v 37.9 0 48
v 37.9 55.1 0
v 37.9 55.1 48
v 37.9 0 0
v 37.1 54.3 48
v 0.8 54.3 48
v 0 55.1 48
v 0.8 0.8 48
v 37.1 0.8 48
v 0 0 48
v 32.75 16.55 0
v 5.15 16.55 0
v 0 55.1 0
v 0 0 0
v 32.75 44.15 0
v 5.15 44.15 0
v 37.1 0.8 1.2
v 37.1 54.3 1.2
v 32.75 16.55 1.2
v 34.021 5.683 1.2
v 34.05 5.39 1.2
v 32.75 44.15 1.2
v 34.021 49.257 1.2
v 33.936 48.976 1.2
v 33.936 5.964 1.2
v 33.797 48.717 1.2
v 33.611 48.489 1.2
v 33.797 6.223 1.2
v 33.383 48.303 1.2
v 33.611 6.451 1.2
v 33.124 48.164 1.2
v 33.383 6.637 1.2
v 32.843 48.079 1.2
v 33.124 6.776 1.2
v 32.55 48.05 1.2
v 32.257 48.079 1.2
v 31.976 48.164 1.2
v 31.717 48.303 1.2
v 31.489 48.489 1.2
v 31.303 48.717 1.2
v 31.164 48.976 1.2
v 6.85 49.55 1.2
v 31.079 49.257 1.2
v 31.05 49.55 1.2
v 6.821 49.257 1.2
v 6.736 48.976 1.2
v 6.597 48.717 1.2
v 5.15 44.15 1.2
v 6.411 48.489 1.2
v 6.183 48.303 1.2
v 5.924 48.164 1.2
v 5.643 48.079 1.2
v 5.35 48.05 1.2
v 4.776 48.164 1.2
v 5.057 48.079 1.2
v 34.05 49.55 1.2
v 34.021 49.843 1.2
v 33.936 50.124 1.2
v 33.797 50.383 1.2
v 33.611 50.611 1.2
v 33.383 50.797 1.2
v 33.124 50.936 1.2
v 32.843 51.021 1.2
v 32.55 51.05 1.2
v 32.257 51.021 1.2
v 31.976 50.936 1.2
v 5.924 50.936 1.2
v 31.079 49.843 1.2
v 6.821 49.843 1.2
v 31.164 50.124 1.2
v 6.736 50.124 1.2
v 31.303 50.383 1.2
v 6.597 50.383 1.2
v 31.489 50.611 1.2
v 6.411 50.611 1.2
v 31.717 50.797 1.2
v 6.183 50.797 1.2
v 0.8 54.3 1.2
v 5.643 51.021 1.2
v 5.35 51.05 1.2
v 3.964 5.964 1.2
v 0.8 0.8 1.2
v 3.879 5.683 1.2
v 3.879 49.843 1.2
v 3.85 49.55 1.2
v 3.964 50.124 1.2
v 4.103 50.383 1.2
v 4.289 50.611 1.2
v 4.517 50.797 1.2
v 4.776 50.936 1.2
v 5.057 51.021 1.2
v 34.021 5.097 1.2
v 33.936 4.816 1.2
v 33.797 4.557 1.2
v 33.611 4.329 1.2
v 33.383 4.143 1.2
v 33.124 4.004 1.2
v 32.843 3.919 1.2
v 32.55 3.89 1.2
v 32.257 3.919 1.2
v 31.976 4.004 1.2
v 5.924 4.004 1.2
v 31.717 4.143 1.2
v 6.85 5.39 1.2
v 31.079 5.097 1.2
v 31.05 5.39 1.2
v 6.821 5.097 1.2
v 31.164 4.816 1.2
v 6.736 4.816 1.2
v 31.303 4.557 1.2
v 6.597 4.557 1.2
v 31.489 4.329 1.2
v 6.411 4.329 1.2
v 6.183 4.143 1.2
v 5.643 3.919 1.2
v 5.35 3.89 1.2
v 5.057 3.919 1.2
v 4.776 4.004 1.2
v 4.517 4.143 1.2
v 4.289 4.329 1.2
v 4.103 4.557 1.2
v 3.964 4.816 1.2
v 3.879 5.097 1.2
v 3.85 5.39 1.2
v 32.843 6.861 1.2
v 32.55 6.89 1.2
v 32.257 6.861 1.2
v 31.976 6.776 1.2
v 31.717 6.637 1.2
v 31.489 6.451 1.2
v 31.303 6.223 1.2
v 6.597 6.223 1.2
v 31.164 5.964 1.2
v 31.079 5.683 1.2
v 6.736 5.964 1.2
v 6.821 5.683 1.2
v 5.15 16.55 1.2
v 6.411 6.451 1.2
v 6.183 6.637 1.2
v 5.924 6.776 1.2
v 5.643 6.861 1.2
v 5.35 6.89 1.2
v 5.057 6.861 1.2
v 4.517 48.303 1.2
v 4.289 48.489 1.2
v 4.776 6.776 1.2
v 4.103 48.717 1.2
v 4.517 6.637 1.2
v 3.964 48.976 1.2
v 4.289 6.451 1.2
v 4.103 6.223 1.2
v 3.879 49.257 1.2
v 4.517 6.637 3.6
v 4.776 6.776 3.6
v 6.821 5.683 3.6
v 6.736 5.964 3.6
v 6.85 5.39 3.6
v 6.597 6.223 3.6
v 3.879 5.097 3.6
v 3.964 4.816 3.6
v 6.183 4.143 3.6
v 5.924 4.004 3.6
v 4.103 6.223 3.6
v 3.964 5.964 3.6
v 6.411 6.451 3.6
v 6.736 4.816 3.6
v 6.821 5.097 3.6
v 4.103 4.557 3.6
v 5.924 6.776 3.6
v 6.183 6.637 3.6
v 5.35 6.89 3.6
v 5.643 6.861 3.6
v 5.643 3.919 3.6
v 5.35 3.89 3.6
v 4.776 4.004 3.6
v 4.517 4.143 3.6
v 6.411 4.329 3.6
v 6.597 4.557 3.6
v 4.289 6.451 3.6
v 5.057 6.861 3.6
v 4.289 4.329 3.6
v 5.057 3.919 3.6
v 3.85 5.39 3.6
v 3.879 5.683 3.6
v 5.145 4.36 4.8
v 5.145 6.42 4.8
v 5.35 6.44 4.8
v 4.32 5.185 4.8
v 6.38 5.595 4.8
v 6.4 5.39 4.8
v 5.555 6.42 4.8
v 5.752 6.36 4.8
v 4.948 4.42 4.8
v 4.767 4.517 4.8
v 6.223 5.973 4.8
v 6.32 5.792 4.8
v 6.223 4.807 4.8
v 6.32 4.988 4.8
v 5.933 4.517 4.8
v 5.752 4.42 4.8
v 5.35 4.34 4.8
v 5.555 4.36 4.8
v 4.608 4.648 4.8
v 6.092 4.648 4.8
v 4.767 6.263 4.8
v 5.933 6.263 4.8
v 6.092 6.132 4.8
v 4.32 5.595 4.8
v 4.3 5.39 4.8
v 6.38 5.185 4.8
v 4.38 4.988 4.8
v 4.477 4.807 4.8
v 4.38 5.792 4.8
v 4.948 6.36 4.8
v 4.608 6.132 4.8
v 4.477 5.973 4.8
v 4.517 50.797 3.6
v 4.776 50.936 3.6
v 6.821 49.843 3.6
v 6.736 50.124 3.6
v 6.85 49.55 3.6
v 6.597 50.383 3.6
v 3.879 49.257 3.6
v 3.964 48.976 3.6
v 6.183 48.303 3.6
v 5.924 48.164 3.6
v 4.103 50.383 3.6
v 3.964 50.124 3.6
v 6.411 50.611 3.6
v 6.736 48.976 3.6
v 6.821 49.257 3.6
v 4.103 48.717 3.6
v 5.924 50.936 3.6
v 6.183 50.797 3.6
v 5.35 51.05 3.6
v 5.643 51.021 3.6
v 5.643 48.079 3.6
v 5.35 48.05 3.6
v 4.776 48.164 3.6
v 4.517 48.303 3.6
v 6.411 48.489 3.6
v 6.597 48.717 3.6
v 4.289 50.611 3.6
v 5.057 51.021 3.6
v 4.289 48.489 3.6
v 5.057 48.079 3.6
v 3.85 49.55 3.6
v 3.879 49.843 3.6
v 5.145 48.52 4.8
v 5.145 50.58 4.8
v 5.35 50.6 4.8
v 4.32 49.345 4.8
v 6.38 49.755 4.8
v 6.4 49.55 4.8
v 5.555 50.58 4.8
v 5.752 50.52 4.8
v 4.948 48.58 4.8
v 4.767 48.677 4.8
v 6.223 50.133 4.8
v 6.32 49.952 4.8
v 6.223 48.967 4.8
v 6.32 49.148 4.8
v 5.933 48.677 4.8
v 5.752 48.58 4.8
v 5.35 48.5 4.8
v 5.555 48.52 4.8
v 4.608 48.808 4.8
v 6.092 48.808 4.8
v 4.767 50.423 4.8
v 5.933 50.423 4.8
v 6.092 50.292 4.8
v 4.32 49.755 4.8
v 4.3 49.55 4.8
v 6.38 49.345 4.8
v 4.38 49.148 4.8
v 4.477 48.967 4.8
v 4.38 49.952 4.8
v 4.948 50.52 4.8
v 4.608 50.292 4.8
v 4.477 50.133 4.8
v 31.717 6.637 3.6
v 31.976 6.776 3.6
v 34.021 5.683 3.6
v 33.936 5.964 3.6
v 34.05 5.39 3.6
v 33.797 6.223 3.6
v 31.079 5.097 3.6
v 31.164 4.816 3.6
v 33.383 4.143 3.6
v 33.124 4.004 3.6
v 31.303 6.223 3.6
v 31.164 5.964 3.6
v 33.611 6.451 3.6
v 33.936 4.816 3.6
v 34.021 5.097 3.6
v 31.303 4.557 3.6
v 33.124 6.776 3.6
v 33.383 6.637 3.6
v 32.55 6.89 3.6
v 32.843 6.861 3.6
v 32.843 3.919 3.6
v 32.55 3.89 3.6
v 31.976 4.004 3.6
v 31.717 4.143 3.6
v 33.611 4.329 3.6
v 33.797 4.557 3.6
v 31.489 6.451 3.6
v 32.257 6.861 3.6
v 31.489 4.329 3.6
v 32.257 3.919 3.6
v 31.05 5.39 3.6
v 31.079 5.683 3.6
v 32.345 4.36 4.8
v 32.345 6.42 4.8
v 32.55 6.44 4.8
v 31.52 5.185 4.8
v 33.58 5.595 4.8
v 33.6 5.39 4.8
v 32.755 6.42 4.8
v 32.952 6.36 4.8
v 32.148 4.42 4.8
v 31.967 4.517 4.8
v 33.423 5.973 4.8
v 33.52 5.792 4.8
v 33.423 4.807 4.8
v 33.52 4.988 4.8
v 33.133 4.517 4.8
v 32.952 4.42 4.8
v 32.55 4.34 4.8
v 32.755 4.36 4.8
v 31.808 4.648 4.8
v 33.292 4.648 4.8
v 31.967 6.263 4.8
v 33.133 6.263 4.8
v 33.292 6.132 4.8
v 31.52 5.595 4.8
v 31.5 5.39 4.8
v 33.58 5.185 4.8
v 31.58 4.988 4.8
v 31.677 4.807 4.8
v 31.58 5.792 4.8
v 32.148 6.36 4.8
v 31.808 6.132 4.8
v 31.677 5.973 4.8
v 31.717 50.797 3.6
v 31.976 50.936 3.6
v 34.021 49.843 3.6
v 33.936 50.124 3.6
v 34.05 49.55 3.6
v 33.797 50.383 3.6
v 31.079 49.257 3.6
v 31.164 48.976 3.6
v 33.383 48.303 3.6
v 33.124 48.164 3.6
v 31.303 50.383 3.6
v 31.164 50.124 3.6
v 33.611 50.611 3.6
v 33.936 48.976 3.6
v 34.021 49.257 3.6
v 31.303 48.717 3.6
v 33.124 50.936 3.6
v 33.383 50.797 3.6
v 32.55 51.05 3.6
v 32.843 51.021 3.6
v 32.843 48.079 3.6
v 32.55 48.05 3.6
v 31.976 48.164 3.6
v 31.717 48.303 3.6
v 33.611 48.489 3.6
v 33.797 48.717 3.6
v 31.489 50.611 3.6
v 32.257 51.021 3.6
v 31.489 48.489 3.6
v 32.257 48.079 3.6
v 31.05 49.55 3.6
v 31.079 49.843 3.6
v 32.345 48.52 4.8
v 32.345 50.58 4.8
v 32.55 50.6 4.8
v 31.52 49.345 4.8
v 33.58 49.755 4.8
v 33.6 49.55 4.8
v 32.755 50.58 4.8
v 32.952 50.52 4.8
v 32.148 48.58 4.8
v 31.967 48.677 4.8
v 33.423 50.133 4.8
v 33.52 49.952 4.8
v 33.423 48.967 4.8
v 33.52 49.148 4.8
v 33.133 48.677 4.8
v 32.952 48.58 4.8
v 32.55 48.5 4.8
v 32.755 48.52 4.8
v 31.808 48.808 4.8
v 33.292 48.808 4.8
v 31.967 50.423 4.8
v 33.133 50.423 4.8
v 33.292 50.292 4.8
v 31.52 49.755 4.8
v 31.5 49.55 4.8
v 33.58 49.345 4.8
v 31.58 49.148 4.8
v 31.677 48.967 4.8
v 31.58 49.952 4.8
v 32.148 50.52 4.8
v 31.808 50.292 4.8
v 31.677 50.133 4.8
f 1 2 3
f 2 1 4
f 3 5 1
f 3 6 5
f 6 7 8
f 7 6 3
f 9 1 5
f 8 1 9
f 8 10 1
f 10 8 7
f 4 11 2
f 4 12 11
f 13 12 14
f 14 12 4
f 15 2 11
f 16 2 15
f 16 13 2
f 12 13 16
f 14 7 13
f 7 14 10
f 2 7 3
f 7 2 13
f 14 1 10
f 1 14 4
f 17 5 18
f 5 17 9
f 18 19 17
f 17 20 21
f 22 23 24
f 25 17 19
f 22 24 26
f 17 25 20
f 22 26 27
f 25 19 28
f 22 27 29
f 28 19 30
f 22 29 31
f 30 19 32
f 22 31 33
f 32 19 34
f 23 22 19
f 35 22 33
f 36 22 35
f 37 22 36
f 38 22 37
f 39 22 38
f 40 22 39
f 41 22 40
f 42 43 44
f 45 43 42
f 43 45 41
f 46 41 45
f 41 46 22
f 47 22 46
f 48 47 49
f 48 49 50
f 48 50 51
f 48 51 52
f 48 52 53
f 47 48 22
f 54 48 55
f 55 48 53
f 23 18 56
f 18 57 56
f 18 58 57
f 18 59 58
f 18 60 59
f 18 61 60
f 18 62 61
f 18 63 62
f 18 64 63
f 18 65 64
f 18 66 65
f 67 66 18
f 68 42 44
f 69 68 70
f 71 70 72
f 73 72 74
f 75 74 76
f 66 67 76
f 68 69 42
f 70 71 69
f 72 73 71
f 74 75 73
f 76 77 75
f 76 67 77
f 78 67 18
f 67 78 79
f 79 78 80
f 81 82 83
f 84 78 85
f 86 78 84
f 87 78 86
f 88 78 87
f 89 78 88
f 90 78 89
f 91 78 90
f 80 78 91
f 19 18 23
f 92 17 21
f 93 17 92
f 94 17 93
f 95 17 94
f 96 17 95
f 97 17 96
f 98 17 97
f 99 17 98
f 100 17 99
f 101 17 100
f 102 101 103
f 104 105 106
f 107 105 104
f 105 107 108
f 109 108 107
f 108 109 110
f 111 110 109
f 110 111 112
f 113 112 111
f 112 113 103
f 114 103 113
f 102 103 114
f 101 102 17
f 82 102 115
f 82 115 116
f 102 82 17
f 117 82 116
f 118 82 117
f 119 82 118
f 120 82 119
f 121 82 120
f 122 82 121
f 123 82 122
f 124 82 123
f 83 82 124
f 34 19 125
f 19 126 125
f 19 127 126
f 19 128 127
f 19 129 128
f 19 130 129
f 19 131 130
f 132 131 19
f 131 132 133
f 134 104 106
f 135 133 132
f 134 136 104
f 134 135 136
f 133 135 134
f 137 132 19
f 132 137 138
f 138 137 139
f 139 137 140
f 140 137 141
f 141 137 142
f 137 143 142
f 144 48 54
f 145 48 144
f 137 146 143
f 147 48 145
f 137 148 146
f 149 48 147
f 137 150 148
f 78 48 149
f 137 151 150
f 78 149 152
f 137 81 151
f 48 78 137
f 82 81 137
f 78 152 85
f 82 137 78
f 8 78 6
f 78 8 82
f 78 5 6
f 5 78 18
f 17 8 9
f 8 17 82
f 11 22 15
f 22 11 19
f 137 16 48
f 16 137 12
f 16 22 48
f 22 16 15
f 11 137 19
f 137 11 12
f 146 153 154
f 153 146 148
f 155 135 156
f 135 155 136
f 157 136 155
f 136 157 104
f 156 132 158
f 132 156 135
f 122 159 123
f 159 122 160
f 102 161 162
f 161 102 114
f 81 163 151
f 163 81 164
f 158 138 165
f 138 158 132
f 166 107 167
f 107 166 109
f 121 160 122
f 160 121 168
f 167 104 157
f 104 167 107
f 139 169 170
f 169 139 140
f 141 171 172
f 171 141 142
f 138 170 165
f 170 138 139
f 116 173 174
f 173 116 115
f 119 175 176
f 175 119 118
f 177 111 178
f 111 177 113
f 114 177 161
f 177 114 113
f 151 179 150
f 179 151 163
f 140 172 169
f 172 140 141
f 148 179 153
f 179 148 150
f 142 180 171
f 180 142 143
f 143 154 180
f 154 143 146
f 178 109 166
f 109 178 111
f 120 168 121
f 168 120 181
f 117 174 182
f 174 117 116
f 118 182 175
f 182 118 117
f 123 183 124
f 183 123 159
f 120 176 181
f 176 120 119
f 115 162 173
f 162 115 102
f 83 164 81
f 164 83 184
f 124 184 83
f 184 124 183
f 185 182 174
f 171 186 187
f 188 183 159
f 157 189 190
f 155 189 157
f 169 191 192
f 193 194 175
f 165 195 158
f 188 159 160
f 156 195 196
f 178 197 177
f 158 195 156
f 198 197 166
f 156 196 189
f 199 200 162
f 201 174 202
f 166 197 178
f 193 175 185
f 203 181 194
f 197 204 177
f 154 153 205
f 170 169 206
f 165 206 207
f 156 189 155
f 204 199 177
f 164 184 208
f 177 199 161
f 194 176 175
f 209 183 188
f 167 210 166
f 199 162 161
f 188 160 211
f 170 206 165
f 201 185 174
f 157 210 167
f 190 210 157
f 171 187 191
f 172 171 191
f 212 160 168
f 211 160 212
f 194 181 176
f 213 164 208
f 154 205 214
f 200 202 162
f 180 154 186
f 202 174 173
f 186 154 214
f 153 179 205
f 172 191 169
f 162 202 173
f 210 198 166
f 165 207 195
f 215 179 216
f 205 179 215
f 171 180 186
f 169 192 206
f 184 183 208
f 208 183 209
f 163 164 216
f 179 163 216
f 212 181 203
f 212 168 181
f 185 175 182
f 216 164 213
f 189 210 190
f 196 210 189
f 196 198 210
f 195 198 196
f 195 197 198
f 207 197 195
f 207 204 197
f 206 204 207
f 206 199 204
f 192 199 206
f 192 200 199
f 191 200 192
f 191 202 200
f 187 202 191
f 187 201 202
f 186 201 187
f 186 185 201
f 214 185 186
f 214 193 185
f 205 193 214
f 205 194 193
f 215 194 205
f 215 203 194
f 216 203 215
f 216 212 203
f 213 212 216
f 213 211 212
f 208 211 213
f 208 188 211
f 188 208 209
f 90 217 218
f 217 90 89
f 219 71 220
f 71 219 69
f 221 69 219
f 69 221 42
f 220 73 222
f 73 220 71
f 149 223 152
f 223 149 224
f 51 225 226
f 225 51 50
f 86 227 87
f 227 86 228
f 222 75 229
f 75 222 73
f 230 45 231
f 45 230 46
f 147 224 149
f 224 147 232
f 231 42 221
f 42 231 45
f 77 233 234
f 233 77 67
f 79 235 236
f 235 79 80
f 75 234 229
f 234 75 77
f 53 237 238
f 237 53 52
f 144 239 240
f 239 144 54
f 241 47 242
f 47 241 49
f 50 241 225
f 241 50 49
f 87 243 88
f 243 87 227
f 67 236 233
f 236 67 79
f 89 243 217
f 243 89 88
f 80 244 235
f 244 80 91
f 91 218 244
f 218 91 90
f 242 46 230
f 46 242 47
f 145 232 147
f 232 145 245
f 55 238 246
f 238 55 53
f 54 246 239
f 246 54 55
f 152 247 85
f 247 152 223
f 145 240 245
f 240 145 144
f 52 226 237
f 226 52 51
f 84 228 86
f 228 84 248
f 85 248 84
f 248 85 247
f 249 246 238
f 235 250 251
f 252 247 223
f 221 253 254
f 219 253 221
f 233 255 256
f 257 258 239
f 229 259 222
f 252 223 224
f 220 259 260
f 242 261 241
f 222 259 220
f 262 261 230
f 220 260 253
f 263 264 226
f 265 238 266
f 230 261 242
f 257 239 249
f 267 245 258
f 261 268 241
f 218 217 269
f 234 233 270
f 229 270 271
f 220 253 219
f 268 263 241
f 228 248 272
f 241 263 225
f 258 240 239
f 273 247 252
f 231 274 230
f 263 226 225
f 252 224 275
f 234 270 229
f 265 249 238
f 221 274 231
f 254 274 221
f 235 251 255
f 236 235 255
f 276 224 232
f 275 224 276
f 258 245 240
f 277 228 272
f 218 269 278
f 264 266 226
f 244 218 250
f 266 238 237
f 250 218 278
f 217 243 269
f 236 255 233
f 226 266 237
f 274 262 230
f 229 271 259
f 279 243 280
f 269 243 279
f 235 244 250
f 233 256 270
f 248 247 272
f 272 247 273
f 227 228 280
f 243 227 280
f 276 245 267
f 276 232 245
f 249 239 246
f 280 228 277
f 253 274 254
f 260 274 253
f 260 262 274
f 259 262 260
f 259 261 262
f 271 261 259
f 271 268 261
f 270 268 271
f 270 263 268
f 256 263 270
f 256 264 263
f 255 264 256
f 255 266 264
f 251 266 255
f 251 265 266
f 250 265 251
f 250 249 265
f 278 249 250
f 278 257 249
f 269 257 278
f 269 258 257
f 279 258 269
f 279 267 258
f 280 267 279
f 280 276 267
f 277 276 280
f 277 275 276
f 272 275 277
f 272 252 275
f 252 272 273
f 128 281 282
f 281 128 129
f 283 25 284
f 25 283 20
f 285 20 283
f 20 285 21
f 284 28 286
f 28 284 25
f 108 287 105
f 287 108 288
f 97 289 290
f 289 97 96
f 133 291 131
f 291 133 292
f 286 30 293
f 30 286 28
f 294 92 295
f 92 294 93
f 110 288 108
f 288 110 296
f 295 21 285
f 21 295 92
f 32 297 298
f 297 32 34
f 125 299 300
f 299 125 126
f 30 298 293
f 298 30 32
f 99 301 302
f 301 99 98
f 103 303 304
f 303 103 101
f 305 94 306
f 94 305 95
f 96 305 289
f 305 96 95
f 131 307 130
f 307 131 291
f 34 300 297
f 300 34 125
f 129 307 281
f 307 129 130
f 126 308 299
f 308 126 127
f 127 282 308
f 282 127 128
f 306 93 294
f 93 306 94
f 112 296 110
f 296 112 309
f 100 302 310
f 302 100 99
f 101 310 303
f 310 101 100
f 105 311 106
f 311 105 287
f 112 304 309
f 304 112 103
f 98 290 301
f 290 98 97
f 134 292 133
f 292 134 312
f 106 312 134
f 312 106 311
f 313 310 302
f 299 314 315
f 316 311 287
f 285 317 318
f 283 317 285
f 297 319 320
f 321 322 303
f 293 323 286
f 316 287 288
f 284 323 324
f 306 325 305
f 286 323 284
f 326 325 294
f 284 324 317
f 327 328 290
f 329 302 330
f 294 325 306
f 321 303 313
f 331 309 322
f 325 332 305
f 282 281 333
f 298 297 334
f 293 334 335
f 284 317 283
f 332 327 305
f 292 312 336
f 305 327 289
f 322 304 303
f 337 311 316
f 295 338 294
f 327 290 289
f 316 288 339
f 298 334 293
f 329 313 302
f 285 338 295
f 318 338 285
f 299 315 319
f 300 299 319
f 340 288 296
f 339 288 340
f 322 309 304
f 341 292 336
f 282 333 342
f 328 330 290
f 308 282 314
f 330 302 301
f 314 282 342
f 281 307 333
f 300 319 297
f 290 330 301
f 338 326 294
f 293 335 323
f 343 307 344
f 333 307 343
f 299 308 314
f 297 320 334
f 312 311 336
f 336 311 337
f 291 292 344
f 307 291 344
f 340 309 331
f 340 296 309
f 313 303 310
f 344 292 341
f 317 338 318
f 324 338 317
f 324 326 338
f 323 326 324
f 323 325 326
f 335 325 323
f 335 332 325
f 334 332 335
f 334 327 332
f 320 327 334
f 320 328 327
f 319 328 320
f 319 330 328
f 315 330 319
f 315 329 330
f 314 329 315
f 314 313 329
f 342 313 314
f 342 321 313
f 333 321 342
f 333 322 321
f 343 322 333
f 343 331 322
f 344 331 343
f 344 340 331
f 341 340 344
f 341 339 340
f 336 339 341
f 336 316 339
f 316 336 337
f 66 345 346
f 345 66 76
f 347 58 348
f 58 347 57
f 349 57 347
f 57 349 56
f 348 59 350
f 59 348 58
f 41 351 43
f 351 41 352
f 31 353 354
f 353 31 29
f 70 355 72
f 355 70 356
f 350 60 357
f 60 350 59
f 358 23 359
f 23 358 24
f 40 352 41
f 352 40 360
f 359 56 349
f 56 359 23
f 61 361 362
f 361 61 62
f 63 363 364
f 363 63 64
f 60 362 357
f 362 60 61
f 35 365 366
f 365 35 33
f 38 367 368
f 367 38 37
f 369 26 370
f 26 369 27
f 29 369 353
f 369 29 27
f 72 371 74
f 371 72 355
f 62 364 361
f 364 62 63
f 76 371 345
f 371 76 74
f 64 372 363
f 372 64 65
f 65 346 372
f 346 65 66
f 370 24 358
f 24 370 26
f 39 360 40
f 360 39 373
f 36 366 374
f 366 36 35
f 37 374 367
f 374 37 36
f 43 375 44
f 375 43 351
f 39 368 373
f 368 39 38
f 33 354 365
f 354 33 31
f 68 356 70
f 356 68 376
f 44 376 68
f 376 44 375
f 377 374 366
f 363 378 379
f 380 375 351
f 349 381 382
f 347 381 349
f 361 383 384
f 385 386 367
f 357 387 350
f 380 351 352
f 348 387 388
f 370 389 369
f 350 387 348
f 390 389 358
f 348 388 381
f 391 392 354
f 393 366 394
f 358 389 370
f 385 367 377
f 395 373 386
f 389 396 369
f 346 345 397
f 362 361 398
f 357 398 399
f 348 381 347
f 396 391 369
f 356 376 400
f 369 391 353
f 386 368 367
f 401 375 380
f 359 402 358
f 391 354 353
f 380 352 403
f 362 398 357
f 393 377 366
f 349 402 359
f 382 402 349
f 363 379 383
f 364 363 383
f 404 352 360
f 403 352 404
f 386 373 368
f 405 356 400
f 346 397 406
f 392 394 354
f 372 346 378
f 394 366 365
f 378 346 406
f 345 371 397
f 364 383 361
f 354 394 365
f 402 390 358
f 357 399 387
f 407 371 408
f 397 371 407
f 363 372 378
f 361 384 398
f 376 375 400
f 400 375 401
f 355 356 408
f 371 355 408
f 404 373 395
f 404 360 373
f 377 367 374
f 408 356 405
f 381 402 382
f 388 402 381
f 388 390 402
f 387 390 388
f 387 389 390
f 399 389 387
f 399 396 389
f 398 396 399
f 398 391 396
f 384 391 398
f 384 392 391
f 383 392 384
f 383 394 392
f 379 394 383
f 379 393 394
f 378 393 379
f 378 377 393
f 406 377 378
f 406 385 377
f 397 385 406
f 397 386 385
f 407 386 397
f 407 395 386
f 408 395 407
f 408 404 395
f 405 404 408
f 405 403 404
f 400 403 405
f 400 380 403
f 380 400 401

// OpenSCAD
display_x = 32.8;
display_y = 50;
nozzle = 0.4;
wall = nozzle * 2;
print_margin = 0.15;
extra_space = 2;
outer_x = display_x + wall + print_margin * 2 + extra_space * 2;
outer_y = display_y + wall + print_margin * 2 + extra_space * 2;
inner_x = outer_x - 2 * wall;
inner_y = outer_y - 2 * wall;
outer_height_z = 48;
display_window = 27.6;
epsilon = 0.01;
window_y_offset = 2.8;
pin_diameter = 3;
pin_height = 4;
pin_y_top_offset = 5.4;
pin_y_bottom_offset = 11.16;
pin_x_offset = 0.2;
pin_facets = 32;
make_flat = false;

module outer_shell() {
    cube([outer_x, outer_y, outer_height_z]);
}

module inner_cavity() {
    translate([wall, wall, wall + nozzle])
        cube([inner_x, inner_y, outer_height_z]);
}

module eink_window() {
    translate([
        (outer_x - display_window) / 2,
        ((outer_y - display_window) / 2) + window_y_offset,
        -epsilon
    ])
        cube([
            display_window,
            display_window,
            wall + 2 * epsilon + 0.5
        ]);
}

module chamfered_pin(d, h) {
    chamfer_height = h * 0.3;
    base_height = h - chamfer_height;
    cylinder(h = base_height, d = d, $fn = pin_facets);
    translate([0, 0, base_height])
        cylinder(h = chamfer_height, d1 = d, d2 = d * 0.7, $fn = pin_facets);
}

module pins() {
    window_x_left = (outer_x - display_window) / 2;
    window_x_right = (outer_x + display_window) / 2;
    window_y_bot = ((outer_y - display_window) / 2) + window_y_offset;
    window_y_top = ((outer_y + display_window) / 2) + window_y_offset;
    pin_x_left = window_x_left + pin_x_offset;
    pin_x_right = window_x_right - pin_x_offset;
    for (px = [pin_x_left, pin_x_right]) {
        translate([px, window_y_bot - pin_y_bottom_offset, wall])
            chamfered_pin(pin_diameter, pin_height);
        translate([px, window_y_top + pin_y_top_offset, wall])
            chamfered_pin(pin_diameter, pin_height);
    }
}

module conditional_projection(apply) {
    if (apply) {
        projection(cut = true) translate([0, 0, -1]) children();
    } else {
        children();
    }
}

conditional_projection(make_flat) {
    union() {
        difference() {
            outer_shell();
            inner_cavity();
            eink_window();
        }
        pins();
        if (make_flat) { eink_window(); }
    }
}
